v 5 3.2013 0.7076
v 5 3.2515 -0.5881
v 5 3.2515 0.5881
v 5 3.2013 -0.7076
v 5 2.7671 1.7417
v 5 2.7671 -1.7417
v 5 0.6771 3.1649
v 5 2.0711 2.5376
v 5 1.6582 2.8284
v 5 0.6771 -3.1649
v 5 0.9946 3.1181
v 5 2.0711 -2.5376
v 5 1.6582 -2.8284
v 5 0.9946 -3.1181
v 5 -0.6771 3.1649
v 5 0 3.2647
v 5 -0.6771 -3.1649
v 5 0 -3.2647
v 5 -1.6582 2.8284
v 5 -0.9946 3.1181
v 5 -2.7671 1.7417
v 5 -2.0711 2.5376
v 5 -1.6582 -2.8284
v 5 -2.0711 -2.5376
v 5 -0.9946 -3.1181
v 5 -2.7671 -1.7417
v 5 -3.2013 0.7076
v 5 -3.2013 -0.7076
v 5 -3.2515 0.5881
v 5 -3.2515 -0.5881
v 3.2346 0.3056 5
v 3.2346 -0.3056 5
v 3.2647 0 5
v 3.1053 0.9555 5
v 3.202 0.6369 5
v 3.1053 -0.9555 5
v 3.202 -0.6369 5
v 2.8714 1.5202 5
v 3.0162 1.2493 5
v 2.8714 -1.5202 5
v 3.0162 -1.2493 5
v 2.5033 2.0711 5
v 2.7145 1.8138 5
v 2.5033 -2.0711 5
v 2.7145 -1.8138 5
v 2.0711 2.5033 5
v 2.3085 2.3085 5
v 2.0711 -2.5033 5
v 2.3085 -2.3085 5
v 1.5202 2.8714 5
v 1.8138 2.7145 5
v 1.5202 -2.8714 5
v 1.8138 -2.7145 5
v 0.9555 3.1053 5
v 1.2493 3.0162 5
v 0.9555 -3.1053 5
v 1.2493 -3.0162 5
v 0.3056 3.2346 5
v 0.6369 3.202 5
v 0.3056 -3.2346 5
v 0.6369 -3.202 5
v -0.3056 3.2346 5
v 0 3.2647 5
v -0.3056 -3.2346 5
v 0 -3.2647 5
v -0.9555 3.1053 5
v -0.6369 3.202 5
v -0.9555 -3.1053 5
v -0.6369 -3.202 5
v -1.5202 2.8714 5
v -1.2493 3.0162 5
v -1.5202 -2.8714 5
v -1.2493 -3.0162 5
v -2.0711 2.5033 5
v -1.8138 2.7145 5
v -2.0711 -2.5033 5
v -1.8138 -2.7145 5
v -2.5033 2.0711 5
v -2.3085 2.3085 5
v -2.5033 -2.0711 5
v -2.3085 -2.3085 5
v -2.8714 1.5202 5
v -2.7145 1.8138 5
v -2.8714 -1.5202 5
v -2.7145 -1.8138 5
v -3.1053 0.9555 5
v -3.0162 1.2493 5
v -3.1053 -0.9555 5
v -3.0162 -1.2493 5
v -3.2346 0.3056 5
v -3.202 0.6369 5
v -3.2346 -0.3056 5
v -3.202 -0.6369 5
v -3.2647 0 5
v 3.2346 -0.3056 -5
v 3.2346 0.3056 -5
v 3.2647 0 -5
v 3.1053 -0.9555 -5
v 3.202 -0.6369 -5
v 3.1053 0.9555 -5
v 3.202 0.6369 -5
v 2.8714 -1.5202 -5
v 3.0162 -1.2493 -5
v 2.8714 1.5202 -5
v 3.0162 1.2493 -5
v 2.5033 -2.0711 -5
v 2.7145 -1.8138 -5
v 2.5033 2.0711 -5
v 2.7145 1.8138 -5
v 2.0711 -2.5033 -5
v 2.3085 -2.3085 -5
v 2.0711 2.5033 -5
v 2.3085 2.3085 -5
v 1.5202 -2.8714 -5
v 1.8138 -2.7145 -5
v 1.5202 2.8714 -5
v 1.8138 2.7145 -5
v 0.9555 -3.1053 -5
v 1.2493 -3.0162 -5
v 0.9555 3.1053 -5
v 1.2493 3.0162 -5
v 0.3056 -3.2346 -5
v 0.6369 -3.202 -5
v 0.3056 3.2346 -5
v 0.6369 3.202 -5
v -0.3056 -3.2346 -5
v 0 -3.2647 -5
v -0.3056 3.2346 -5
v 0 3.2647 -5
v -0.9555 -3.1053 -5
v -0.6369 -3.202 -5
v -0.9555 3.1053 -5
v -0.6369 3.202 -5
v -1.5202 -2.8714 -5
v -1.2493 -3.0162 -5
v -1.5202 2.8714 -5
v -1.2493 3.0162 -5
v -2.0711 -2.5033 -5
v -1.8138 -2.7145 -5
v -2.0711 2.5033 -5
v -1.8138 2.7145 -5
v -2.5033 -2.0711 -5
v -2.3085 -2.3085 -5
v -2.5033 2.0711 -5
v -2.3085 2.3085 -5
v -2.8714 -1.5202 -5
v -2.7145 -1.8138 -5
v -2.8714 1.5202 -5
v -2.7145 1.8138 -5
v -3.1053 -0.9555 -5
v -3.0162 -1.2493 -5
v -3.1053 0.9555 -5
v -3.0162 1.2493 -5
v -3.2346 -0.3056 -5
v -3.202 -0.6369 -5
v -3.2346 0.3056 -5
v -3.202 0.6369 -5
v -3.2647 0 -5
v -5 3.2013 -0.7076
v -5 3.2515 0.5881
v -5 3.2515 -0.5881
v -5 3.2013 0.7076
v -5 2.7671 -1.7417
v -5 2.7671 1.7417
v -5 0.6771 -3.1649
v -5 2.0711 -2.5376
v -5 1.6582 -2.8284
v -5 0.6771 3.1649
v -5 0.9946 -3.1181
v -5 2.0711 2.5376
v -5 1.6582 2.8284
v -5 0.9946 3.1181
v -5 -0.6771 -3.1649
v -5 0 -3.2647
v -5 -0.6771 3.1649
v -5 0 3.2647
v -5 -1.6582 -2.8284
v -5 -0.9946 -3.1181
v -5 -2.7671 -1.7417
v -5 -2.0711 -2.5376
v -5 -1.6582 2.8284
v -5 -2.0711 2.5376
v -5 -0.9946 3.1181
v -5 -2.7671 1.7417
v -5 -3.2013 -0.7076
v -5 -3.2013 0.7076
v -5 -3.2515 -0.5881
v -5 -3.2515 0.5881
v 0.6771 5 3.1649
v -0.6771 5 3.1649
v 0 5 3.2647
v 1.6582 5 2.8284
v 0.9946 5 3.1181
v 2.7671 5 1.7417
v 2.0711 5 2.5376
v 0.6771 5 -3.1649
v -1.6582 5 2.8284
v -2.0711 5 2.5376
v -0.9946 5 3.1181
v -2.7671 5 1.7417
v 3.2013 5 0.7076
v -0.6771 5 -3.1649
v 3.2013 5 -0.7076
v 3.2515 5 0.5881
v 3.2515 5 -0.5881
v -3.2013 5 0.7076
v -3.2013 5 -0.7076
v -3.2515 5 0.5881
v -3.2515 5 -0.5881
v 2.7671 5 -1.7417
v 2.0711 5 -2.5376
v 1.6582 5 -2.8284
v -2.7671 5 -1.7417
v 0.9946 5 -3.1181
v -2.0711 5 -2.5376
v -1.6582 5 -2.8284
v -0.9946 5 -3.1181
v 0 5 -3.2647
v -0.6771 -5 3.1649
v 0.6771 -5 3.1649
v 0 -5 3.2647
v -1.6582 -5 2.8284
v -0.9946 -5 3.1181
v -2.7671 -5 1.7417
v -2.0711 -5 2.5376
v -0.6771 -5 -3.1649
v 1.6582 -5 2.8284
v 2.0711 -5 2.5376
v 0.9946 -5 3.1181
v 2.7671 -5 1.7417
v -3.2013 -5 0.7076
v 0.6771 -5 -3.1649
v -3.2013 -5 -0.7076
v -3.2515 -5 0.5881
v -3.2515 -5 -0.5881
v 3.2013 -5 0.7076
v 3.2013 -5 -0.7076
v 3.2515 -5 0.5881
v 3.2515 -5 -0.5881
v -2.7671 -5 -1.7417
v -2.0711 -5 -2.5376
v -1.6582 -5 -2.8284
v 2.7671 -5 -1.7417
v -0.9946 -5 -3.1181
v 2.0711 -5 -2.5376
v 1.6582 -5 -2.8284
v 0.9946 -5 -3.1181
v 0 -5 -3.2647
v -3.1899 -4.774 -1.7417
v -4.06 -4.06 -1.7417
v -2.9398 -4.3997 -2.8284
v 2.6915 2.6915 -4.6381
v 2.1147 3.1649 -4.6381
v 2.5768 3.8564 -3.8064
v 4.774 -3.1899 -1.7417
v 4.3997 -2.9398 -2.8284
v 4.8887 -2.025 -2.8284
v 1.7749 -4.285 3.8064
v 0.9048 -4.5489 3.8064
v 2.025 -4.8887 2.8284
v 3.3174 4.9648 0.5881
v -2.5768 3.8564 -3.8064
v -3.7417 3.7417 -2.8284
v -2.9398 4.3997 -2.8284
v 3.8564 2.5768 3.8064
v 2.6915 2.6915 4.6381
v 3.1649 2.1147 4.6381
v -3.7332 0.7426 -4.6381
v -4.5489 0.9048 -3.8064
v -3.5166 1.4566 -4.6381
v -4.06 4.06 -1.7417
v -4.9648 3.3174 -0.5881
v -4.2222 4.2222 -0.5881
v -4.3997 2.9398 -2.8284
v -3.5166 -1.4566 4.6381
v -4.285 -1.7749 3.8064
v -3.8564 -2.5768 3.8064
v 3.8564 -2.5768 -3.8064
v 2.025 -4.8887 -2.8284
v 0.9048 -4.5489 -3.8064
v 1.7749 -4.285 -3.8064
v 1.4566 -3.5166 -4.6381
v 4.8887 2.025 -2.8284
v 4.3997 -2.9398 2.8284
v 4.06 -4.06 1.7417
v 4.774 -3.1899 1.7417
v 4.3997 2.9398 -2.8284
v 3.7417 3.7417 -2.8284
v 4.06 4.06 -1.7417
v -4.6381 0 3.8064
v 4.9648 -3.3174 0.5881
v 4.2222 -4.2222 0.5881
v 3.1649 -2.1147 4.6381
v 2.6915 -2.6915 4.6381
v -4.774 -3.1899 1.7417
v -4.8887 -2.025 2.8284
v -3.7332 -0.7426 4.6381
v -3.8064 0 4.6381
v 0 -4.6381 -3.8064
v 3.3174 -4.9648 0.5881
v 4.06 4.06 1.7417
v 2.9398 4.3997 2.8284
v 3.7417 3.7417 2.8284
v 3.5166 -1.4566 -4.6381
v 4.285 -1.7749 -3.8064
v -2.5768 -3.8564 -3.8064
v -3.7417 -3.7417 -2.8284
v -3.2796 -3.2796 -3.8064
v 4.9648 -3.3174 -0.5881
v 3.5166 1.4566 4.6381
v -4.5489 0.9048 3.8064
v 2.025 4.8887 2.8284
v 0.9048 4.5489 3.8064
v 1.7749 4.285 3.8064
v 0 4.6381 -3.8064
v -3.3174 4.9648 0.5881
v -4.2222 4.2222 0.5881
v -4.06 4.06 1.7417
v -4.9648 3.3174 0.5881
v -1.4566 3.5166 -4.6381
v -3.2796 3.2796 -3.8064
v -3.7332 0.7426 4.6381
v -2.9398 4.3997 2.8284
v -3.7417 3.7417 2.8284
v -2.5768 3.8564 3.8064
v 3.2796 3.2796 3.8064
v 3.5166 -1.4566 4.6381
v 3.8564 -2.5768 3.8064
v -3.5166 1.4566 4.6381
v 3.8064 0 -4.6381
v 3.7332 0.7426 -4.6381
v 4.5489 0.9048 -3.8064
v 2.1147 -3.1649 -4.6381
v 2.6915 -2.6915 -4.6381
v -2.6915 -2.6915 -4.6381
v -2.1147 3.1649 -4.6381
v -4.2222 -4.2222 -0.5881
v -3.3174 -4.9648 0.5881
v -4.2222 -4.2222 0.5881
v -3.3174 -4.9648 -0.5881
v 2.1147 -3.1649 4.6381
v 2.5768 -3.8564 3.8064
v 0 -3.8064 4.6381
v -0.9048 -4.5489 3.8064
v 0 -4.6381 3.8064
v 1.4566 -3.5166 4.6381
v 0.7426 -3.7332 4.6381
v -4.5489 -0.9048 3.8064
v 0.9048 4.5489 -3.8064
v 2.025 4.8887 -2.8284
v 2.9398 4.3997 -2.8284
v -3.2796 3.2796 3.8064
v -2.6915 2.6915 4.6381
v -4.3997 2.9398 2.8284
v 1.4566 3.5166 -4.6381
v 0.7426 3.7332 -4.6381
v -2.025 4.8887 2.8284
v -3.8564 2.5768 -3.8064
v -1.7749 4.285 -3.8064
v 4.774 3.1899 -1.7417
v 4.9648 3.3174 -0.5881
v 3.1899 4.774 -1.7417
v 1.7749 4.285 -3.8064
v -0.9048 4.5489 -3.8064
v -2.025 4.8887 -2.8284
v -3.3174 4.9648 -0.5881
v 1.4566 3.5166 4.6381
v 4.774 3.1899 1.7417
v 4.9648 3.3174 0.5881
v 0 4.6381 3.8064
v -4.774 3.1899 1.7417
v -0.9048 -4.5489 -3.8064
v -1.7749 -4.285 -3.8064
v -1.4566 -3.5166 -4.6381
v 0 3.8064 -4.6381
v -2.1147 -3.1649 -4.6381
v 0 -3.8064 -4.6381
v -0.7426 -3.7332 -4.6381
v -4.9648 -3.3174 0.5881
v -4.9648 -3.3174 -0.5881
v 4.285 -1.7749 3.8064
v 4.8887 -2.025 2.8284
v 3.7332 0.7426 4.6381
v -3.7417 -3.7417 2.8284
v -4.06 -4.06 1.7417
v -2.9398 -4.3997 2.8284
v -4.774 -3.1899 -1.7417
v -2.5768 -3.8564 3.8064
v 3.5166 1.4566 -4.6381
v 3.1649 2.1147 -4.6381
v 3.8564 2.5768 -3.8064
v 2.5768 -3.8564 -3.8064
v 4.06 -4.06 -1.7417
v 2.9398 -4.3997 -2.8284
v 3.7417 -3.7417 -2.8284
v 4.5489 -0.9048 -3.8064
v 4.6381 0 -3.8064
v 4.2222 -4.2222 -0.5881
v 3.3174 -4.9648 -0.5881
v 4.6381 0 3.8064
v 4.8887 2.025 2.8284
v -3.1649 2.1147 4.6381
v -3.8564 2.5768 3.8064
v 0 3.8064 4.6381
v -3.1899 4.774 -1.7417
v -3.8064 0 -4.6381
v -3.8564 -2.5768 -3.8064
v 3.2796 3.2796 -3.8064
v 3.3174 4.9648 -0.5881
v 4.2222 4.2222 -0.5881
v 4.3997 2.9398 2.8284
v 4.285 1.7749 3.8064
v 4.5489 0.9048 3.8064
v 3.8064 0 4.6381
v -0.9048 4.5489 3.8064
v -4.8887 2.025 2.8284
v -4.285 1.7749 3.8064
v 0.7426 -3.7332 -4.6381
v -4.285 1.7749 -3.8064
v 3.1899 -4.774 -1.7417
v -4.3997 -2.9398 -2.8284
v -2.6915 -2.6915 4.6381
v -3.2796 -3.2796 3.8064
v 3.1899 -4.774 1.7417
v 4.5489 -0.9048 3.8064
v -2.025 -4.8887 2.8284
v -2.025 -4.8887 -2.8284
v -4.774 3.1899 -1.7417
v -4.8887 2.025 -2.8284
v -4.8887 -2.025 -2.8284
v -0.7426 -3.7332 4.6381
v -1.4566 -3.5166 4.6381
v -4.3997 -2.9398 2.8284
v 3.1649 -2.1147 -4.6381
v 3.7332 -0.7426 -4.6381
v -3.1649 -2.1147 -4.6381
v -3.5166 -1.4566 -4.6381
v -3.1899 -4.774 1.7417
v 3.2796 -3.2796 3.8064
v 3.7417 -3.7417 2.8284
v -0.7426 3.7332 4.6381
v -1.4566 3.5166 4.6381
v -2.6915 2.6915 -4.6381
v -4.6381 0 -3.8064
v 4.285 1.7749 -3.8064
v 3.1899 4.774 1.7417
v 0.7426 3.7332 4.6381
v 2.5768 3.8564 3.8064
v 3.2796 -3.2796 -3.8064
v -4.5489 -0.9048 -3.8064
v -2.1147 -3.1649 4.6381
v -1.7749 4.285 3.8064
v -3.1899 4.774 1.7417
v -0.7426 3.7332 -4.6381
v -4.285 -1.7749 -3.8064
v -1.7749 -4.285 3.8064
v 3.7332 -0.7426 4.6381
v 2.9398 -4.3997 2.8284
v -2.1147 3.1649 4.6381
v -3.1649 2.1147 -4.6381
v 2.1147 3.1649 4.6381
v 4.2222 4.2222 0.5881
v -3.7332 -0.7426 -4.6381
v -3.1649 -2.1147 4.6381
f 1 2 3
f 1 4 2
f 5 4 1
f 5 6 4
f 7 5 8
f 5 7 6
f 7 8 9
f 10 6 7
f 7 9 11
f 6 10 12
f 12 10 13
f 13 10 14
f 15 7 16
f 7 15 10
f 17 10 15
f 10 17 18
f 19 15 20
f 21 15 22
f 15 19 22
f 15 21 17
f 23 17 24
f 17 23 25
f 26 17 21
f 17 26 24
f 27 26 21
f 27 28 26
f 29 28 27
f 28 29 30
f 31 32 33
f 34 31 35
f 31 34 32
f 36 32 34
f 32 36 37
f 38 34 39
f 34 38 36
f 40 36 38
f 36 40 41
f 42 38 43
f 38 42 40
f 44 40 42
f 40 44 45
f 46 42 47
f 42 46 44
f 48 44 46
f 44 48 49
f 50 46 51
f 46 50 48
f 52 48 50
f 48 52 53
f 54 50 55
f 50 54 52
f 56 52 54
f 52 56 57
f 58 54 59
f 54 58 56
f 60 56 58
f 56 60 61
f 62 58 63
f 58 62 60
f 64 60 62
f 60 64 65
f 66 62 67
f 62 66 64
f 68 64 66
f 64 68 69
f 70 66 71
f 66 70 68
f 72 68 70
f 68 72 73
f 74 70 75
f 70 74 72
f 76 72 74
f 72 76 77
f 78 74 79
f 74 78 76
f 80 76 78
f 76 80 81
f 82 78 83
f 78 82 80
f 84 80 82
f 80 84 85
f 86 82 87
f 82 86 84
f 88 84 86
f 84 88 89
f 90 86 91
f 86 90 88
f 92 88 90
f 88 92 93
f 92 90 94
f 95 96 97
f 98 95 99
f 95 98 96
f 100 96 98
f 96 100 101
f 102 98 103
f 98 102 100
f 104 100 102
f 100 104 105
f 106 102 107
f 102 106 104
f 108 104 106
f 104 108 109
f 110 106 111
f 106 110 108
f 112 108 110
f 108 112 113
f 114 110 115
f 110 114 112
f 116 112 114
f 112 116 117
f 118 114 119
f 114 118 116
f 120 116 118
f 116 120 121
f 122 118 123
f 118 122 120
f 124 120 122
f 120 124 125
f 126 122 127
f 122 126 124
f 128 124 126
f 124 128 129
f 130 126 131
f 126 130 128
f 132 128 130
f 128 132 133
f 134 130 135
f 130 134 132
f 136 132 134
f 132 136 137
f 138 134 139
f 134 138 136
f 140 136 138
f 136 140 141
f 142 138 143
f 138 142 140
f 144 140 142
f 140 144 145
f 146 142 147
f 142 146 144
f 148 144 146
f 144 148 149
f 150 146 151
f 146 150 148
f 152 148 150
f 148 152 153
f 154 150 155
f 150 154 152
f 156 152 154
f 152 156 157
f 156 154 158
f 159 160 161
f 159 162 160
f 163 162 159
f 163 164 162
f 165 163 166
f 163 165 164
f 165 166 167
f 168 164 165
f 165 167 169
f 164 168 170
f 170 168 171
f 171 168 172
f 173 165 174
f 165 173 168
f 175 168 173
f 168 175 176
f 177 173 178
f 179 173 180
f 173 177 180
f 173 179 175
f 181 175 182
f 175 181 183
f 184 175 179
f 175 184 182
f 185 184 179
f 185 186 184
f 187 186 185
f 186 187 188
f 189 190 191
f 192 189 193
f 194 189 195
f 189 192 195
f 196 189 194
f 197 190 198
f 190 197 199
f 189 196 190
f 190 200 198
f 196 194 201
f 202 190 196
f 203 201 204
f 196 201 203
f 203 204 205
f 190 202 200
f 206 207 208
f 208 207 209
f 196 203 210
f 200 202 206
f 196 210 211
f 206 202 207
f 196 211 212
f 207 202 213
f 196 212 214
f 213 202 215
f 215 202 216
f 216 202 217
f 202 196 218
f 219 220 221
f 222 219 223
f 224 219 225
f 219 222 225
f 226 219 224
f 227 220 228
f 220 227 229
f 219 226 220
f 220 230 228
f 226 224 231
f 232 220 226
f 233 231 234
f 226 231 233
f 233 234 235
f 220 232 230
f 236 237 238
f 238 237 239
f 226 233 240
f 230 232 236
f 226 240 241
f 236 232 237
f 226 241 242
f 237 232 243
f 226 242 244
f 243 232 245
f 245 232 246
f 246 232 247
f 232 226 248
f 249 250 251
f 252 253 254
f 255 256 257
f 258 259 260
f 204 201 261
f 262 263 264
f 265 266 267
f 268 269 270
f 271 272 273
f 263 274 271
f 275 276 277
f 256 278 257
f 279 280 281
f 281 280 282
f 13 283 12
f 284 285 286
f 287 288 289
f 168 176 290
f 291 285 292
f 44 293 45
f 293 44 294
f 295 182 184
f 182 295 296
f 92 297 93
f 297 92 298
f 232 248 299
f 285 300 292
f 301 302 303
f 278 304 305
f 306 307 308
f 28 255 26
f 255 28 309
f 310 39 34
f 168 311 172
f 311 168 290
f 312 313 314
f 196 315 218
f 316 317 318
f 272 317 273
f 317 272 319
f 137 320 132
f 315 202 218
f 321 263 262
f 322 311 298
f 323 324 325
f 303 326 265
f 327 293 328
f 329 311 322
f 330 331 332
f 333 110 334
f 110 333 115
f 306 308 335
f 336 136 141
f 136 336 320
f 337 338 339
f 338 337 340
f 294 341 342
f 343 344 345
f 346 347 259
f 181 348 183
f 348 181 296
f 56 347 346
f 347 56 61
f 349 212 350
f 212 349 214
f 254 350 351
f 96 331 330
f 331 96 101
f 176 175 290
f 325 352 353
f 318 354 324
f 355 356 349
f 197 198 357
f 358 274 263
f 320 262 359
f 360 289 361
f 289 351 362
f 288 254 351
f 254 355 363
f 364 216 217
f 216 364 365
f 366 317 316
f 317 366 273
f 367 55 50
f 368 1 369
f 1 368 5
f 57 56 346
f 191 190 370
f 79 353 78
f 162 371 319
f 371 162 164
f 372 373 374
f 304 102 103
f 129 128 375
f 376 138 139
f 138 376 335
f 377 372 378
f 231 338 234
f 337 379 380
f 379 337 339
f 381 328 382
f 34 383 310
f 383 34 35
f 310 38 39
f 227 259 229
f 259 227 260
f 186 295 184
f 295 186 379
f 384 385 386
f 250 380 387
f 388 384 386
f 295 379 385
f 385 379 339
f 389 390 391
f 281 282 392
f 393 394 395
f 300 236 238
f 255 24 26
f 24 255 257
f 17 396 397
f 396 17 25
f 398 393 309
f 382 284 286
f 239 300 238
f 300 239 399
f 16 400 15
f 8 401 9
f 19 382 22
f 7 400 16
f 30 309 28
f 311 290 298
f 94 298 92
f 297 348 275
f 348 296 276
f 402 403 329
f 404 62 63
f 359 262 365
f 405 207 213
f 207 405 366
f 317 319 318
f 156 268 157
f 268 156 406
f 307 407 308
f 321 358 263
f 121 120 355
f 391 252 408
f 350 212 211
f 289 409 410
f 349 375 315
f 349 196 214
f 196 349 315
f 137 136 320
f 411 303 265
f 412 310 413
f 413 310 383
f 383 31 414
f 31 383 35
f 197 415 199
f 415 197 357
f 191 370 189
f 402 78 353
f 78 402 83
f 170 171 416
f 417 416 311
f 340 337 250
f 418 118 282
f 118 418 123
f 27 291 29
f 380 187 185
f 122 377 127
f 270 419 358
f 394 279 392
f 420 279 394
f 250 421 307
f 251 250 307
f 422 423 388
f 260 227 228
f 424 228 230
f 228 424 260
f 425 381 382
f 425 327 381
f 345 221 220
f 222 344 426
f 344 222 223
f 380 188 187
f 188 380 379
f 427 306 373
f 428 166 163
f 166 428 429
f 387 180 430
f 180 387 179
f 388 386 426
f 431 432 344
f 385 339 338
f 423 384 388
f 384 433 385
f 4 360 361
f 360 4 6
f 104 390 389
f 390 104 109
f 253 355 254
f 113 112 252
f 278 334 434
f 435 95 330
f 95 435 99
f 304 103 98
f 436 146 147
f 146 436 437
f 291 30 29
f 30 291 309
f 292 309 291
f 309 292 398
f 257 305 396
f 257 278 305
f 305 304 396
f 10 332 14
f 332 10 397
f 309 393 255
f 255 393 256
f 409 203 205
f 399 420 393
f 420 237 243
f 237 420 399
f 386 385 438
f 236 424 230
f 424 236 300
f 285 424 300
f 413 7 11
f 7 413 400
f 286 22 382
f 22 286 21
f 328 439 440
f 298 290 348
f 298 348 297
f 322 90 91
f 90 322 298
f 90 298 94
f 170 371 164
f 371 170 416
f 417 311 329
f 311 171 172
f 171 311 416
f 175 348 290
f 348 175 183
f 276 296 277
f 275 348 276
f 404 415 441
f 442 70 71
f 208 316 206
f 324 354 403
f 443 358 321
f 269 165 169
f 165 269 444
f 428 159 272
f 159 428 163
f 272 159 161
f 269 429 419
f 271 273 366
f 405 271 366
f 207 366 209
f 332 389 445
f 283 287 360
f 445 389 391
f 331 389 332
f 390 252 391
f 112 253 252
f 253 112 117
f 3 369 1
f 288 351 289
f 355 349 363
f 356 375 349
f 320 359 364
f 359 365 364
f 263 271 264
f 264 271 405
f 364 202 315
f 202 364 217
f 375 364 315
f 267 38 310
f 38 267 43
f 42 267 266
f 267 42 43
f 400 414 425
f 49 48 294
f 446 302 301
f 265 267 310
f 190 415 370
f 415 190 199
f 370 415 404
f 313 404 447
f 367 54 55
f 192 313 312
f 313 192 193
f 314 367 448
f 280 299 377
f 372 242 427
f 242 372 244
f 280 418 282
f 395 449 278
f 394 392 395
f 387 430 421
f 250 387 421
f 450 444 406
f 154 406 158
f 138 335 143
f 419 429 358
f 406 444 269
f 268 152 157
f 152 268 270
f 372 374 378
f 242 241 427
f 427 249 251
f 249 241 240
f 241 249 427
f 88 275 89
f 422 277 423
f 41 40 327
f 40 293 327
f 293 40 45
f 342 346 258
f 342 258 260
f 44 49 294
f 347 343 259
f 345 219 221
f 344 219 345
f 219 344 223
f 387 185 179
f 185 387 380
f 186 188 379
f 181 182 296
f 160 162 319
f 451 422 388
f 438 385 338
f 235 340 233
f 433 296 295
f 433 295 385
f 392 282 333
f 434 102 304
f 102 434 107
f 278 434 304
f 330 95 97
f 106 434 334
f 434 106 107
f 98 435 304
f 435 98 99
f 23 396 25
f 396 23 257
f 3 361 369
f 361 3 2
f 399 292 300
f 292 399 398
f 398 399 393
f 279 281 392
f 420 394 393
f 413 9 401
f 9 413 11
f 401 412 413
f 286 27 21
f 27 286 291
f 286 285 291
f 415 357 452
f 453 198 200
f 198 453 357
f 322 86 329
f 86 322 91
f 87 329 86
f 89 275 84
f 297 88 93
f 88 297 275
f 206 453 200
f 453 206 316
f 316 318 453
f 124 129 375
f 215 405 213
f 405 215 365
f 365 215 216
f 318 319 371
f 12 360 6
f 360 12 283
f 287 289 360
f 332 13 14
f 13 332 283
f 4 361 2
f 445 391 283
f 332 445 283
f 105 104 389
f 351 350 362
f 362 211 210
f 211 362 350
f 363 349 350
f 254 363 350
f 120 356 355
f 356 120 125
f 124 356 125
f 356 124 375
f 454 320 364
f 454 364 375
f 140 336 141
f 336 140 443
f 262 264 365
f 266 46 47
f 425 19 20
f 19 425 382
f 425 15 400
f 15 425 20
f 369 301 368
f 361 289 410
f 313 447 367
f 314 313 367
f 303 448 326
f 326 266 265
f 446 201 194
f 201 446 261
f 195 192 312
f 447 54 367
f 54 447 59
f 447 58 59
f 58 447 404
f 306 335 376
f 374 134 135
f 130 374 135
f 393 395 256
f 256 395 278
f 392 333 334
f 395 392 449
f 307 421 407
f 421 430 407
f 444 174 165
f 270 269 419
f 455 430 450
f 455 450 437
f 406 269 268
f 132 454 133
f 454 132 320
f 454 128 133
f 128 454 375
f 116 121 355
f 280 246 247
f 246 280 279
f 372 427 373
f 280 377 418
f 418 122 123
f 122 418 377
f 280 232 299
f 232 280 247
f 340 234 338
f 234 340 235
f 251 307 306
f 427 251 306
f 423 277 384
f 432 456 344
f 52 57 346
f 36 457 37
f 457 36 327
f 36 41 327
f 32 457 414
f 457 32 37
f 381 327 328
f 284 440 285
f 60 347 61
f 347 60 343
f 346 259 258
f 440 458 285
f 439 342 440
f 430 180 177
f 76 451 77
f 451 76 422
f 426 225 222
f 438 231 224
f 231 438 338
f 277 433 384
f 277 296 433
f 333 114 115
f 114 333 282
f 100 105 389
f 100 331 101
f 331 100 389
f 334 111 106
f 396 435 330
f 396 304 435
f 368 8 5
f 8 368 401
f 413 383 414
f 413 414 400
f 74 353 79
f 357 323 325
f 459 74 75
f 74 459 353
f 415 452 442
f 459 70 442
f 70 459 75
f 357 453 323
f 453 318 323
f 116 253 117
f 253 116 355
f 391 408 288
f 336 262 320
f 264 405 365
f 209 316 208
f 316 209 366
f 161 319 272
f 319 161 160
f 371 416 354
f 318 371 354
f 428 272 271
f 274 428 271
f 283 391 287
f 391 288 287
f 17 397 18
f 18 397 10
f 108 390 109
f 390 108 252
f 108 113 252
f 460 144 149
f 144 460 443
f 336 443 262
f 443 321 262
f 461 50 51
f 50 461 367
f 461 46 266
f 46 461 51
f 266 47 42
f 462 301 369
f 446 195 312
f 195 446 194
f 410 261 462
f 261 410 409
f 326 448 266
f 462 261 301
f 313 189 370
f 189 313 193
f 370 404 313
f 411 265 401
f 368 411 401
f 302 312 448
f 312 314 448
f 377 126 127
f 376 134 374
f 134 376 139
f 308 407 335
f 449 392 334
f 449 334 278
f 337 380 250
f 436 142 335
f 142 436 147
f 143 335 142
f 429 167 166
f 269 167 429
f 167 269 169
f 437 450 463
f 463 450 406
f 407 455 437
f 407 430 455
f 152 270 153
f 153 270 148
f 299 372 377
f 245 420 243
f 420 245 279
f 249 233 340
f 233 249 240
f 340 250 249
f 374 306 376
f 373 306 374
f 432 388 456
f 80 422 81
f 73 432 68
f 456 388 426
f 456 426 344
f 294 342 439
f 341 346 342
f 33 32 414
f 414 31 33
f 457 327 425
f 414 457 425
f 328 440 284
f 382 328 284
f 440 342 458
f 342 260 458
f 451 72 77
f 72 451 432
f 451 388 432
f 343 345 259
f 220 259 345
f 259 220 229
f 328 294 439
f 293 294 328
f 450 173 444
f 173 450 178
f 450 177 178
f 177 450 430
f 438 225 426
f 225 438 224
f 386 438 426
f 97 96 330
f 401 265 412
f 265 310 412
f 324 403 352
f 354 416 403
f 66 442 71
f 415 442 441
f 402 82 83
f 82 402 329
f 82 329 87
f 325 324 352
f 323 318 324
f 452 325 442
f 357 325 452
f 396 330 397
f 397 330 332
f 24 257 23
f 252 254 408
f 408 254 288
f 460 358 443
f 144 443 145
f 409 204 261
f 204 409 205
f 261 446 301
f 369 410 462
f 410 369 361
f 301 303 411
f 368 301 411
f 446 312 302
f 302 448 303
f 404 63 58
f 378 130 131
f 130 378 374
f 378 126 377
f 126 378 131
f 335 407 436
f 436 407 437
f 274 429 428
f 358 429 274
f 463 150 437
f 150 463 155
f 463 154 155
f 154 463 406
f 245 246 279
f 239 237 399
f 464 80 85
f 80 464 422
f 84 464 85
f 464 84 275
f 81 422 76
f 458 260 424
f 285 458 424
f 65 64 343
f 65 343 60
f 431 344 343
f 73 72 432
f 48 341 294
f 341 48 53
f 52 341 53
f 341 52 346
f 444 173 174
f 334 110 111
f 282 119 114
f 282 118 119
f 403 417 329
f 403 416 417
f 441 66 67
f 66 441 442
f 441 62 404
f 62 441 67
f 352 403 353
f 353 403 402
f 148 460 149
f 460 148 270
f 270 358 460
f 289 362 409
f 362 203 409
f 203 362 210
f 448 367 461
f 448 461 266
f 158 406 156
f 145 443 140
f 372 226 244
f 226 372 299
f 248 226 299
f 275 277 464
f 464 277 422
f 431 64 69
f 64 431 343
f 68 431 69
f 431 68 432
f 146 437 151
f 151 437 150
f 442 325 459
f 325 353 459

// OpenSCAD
// Generated by scadwright. Do not hand-edit —
// edit the Python source and regenerate.

$fn = 32;

intersection() {
    cube([10, 10, 10], center=true);
    sphere(r=6);
}
